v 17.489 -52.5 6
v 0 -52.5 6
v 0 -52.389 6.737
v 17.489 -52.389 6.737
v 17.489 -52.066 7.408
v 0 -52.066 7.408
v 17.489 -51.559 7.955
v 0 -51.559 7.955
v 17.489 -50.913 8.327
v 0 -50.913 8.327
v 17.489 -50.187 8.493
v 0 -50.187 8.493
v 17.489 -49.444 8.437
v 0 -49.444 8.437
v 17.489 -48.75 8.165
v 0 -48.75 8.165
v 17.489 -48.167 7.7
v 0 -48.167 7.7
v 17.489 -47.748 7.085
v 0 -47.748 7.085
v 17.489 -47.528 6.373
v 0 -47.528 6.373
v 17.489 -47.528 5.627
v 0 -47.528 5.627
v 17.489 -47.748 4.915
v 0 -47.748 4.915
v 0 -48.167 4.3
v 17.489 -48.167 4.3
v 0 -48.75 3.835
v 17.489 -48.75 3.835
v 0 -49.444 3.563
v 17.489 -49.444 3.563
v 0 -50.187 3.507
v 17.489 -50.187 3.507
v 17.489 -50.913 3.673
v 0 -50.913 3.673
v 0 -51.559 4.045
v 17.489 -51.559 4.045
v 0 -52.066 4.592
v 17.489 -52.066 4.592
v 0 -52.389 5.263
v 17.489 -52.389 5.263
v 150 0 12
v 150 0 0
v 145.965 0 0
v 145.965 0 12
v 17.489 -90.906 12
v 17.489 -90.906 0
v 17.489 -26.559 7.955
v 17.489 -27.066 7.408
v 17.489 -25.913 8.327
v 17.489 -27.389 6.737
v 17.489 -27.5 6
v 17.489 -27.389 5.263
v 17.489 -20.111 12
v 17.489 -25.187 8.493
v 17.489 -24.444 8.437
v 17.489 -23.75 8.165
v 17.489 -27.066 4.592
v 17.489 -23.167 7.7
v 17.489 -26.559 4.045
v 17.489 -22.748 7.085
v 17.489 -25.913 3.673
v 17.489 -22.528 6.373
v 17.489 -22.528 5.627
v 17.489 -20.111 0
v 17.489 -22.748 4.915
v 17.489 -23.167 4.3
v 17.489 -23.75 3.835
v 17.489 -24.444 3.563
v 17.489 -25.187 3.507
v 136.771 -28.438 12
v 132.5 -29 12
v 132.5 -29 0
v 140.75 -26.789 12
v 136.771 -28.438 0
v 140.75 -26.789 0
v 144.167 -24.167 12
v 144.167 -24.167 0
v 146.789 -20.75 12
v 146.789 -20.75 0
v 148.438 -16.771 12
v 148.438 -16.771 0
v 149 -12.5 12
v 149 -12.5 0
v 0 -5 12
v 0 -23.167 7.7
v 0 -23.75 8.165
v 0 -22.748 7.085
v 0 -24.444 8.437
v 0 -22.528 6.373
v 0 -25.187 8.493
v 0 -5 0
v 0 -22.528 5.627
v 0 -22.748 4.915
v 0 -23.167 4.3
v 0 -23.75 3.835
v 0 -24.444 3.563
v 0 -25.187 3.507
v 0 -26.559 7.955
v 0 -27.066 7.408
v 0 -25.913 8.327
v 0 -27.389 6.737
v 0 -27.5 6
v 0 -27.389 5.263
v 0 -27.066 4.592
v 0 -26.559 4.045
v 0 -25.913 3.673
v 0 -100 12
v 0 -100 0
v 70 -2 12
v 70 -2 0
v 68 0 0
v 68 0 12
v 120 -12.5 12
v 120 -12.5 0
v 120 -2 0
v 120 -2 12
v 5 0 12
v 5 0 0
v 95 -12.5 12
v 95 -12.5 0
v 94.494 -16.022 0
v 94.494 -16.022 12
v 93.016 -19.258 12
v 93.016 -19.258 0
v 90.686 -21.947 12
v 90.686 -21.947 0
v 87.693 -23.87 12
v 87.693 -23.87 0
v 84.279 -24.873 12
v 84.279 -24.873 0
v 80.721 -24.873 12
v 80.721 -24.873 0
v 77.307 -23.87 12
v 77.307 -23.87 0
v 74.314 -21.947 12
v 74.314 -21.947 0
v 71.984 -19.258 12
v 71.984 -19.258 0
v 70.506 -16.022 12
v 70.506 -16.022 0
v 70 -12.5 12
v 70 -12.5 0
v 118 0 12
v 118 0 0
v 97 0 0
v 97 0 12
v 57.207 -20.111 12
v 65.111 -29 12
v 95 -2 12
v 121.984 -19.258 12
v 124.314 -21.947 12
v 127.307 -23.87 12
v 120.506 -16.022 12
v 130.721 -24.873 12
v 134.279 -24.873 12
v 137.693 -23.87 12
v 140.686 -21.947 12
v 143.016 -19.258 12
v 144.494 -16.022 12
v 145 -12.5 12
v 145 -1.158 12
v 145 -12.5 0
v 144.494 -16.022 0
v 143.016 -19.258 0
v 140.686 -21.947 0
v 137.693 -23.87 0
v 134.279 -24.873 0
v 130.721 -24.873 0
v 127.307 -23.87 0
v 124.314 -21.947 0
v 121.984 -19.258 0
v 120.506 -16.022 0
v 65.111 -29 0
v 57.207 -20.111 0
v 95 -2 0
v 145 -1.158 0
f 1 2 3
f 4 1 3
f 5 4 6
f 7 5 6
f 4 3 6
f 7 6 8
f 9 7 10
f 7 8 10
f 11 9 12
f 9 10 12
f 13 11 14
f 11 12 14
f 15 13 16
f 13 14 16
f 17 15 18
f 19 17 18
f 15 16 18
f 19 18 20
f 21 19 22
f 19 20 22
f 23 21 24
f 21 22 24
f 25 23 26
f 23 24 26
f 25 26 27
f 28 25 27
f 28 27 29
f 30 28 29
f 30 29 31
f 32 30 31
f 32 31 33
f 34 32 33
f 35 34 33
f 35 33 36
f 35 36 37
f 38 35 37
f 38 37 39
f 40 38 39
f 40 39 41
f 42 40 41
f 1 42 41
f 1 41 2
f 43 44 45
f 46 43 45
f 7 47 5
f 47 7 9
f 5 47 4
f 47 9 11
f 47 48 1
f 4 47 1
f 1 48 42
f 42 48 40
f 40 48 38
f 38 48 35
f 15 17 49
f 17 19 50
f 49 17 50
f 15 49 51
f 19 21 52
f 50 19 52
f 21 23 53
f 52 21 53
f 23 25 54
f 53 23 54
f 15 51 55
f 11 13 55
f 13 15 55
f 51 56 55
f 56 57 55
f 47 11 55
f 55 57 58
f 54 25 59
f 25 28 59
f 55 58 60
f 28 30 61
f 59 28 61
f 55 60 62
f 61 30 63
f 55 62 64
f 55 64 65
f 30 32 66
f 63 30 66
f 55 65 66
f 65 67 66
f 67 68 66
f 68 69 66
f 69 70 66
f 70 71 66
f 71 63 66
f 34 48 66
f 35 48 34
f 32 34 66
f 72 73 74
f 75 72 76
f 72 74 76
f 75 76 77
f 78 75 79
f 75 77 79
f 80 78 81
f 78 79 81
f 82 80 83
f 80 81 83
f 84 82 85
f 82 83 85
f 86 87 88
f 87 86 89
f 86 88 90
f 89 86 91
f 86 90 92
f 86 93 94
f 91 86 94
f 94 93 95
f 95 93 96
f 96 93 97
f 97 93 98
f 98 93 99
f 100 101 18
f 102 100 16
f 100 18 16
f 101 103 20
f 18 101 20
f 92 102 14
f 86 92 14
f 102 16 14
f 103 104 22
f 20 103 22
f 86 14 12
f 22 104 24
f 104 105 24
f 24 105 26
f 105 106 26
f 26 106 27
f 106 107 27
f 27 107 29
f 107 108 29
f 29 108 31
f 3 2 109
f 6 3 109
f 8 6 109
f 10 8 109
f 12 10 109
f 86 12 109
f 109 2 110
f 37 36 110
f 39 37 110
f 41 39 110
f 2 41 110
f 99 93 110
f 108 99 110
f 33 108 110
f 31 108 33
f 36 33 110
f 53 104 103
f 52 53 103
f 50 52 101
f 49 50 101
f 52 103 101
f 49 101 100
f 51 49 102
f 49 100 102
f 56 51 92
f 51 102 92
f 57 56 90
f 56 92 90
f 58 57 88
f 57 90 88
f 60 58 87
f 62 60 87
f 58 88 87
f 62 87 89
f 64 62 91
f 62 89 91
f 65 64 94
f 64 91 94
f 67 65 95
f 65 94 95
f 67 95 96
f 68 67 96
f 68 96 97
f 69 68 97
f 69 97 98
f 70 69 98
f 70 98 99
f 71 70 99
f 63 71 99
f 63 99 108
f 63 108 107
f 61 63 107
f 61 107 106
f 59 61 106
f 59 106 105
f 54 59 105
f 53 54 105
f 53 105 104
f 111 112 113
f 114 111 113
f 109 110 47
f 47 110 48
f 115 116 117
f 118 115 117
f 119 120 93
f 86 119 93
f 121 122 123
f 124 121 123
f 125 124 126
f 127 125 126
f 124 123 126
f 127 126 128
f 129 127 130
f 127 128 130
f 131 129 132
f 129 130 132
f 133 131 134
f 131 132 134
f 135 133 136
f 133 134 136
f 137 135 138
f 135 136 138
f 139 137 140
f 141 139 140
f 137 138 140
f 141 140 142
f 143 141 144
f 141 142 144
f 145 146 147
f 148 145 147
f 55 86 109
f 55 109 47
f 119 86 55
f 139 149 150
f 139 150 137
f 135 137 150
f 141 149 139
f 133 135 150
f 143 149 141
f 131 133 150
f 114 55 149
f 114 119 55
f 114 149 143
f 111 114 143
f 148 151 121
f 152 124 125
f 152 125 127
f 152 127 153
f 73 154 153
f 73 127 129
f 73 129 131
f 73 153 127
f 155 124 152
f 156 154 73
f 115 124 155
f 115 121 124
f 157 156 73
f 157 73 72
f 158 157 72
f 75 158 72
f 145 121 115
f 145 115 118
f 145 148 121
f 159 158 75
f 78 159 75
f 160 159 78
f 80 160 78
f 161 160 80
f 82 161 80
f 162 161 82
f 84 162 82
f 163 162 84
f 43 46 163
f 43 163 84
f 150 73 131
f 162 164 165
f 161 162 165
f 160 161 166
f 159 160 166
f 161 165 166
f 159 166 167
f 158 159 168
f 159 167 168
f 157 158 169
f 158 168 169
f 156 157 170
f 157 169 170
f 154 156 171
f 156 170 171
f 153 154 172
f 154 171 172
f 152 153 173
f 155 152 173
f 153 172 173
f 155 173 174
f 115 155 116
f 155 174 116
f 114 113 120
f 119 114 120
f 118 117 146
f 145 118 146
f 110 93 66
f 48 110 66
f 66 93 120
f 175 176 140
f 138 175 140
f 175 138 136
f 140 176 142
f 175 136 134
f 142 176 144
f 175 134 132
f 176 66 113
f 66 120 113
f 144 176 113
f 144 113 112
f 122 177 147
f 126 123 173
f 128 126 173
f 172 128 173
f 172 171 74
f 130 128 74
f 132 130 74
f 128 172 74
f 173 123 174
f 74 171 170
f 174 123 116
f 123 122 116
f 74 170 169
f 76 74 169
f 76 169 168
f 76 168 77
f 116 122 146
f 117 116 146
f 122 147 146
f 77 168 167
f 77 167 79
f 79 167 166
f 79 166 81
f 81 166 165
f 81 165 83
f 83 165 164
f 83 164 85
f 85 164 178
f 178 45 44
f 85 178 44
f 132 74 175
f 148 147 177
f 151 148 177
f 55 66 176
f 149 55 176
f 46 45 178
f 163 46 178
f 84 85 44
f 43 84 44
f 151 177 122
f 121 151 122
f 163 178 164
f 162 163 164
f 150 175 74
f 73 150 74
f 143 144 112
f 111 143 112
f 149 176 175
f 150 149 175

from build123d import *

# Parameters (mm, degrees)
F1_DEPTH = 12
F2_DEPTH = 25
F3_R     = 2.5
F4_DEPTH = 25


# Not quite as in the source:
# - a feature names something its author has since deleted; it is built from what else it names


with BuildPart() as f1:
    # F0 (on Top) → F1 (new body)
    with BuildSketch(Plane.XY):
        with BuildLine():
            Line((5, 0), (0, -5))
            Line((0, -5), (0, -30))
            Line((0, -30), (0, -35))
            Line((0, -35), (0, -60))
            Line((0, -60), (0, -65))
            Line((0, -65), (0, -100))
            Line((0, -100), (17.4887780242, -90.9055213439))
            Line((17.4887780242, -90.9055213439), (17.4887780242, -46.2056212127))
            Line((17.4887780242, -46.2056212127), (17.4887780242, -29))
            Line((17.4887780242, -29), (17.4887780242, -20.1109461486))
            Line((17.4887780242, -20.1109461486), (57.2072267532, -20.1109461486))
            Line((57.2072267532, -20.1109461486), (65.1114210486, -29))
            Line((65.1114210486, -29), (132.5, -29))
            ThreePointArc((132.5, -29), (144.1672618896, -24.1672618896), (149, -12.5))
            Line((149, -12.5), (150, 0))
            Line((150, 0), (145.9653675556, 0))
            Line((145.9653675556, 0), (145, -1.1582256993))
            Line((145, -1.1582256993), (145, -3.3333333333))
            Line((145, -3.3333333333), (145, -12.5))
            ThreePointArc((145, -12.5), (132.5, -25), (120, -12.5))
            Line((120, -12.5), (120, -2))
            Line((120, -2), (118, 0))
            Line((118, 0), (97, 0))
            Line((97, 0), (95, -2))
            Line((95, -2), (95, -12.5))
            ThreePointArc((95, -12.5), (82.5, -25), (70, -12.5))
            Line((70, -12.5), (70, -2))
            Line((70, -2), (68, 0))
            Line((68, 0), (5, 0))
        make_face()
    extrude(amount=F1_DEPTH)

    # F0 (on Top) → F2 (cut)
    with BuildSketch(Plane.XY):
        Polygon((17.4887780242, -46.2056212127), (17.4887780242, -90.9055213439), (27.4864036634, -85.7065764627), (108.4292656183, -38.1771444678), (132.5, -29), (65.1114210486, -29), (57.2072267532, -29), (57.2072267532, -46.2056212127), align=None)
    extrude(amount=-F2_DEPTH, mode=Mode.SUBTRACT)

    # F3 (on face) → F4 (cut)
    with BuildSketch(Plane(origin=(0, 0, 0), x_dir=(0, -1, 0), z_dir=(-1, 0, 0))):
        with Locations((25, 6)):
            Circle(F3_R)
        with Locations((50, 6)):
            Circle(F3_R)
    extrude(amount=-F4_DEPTH, mode=Mode.SUBTRACT)


solid = f1.part
